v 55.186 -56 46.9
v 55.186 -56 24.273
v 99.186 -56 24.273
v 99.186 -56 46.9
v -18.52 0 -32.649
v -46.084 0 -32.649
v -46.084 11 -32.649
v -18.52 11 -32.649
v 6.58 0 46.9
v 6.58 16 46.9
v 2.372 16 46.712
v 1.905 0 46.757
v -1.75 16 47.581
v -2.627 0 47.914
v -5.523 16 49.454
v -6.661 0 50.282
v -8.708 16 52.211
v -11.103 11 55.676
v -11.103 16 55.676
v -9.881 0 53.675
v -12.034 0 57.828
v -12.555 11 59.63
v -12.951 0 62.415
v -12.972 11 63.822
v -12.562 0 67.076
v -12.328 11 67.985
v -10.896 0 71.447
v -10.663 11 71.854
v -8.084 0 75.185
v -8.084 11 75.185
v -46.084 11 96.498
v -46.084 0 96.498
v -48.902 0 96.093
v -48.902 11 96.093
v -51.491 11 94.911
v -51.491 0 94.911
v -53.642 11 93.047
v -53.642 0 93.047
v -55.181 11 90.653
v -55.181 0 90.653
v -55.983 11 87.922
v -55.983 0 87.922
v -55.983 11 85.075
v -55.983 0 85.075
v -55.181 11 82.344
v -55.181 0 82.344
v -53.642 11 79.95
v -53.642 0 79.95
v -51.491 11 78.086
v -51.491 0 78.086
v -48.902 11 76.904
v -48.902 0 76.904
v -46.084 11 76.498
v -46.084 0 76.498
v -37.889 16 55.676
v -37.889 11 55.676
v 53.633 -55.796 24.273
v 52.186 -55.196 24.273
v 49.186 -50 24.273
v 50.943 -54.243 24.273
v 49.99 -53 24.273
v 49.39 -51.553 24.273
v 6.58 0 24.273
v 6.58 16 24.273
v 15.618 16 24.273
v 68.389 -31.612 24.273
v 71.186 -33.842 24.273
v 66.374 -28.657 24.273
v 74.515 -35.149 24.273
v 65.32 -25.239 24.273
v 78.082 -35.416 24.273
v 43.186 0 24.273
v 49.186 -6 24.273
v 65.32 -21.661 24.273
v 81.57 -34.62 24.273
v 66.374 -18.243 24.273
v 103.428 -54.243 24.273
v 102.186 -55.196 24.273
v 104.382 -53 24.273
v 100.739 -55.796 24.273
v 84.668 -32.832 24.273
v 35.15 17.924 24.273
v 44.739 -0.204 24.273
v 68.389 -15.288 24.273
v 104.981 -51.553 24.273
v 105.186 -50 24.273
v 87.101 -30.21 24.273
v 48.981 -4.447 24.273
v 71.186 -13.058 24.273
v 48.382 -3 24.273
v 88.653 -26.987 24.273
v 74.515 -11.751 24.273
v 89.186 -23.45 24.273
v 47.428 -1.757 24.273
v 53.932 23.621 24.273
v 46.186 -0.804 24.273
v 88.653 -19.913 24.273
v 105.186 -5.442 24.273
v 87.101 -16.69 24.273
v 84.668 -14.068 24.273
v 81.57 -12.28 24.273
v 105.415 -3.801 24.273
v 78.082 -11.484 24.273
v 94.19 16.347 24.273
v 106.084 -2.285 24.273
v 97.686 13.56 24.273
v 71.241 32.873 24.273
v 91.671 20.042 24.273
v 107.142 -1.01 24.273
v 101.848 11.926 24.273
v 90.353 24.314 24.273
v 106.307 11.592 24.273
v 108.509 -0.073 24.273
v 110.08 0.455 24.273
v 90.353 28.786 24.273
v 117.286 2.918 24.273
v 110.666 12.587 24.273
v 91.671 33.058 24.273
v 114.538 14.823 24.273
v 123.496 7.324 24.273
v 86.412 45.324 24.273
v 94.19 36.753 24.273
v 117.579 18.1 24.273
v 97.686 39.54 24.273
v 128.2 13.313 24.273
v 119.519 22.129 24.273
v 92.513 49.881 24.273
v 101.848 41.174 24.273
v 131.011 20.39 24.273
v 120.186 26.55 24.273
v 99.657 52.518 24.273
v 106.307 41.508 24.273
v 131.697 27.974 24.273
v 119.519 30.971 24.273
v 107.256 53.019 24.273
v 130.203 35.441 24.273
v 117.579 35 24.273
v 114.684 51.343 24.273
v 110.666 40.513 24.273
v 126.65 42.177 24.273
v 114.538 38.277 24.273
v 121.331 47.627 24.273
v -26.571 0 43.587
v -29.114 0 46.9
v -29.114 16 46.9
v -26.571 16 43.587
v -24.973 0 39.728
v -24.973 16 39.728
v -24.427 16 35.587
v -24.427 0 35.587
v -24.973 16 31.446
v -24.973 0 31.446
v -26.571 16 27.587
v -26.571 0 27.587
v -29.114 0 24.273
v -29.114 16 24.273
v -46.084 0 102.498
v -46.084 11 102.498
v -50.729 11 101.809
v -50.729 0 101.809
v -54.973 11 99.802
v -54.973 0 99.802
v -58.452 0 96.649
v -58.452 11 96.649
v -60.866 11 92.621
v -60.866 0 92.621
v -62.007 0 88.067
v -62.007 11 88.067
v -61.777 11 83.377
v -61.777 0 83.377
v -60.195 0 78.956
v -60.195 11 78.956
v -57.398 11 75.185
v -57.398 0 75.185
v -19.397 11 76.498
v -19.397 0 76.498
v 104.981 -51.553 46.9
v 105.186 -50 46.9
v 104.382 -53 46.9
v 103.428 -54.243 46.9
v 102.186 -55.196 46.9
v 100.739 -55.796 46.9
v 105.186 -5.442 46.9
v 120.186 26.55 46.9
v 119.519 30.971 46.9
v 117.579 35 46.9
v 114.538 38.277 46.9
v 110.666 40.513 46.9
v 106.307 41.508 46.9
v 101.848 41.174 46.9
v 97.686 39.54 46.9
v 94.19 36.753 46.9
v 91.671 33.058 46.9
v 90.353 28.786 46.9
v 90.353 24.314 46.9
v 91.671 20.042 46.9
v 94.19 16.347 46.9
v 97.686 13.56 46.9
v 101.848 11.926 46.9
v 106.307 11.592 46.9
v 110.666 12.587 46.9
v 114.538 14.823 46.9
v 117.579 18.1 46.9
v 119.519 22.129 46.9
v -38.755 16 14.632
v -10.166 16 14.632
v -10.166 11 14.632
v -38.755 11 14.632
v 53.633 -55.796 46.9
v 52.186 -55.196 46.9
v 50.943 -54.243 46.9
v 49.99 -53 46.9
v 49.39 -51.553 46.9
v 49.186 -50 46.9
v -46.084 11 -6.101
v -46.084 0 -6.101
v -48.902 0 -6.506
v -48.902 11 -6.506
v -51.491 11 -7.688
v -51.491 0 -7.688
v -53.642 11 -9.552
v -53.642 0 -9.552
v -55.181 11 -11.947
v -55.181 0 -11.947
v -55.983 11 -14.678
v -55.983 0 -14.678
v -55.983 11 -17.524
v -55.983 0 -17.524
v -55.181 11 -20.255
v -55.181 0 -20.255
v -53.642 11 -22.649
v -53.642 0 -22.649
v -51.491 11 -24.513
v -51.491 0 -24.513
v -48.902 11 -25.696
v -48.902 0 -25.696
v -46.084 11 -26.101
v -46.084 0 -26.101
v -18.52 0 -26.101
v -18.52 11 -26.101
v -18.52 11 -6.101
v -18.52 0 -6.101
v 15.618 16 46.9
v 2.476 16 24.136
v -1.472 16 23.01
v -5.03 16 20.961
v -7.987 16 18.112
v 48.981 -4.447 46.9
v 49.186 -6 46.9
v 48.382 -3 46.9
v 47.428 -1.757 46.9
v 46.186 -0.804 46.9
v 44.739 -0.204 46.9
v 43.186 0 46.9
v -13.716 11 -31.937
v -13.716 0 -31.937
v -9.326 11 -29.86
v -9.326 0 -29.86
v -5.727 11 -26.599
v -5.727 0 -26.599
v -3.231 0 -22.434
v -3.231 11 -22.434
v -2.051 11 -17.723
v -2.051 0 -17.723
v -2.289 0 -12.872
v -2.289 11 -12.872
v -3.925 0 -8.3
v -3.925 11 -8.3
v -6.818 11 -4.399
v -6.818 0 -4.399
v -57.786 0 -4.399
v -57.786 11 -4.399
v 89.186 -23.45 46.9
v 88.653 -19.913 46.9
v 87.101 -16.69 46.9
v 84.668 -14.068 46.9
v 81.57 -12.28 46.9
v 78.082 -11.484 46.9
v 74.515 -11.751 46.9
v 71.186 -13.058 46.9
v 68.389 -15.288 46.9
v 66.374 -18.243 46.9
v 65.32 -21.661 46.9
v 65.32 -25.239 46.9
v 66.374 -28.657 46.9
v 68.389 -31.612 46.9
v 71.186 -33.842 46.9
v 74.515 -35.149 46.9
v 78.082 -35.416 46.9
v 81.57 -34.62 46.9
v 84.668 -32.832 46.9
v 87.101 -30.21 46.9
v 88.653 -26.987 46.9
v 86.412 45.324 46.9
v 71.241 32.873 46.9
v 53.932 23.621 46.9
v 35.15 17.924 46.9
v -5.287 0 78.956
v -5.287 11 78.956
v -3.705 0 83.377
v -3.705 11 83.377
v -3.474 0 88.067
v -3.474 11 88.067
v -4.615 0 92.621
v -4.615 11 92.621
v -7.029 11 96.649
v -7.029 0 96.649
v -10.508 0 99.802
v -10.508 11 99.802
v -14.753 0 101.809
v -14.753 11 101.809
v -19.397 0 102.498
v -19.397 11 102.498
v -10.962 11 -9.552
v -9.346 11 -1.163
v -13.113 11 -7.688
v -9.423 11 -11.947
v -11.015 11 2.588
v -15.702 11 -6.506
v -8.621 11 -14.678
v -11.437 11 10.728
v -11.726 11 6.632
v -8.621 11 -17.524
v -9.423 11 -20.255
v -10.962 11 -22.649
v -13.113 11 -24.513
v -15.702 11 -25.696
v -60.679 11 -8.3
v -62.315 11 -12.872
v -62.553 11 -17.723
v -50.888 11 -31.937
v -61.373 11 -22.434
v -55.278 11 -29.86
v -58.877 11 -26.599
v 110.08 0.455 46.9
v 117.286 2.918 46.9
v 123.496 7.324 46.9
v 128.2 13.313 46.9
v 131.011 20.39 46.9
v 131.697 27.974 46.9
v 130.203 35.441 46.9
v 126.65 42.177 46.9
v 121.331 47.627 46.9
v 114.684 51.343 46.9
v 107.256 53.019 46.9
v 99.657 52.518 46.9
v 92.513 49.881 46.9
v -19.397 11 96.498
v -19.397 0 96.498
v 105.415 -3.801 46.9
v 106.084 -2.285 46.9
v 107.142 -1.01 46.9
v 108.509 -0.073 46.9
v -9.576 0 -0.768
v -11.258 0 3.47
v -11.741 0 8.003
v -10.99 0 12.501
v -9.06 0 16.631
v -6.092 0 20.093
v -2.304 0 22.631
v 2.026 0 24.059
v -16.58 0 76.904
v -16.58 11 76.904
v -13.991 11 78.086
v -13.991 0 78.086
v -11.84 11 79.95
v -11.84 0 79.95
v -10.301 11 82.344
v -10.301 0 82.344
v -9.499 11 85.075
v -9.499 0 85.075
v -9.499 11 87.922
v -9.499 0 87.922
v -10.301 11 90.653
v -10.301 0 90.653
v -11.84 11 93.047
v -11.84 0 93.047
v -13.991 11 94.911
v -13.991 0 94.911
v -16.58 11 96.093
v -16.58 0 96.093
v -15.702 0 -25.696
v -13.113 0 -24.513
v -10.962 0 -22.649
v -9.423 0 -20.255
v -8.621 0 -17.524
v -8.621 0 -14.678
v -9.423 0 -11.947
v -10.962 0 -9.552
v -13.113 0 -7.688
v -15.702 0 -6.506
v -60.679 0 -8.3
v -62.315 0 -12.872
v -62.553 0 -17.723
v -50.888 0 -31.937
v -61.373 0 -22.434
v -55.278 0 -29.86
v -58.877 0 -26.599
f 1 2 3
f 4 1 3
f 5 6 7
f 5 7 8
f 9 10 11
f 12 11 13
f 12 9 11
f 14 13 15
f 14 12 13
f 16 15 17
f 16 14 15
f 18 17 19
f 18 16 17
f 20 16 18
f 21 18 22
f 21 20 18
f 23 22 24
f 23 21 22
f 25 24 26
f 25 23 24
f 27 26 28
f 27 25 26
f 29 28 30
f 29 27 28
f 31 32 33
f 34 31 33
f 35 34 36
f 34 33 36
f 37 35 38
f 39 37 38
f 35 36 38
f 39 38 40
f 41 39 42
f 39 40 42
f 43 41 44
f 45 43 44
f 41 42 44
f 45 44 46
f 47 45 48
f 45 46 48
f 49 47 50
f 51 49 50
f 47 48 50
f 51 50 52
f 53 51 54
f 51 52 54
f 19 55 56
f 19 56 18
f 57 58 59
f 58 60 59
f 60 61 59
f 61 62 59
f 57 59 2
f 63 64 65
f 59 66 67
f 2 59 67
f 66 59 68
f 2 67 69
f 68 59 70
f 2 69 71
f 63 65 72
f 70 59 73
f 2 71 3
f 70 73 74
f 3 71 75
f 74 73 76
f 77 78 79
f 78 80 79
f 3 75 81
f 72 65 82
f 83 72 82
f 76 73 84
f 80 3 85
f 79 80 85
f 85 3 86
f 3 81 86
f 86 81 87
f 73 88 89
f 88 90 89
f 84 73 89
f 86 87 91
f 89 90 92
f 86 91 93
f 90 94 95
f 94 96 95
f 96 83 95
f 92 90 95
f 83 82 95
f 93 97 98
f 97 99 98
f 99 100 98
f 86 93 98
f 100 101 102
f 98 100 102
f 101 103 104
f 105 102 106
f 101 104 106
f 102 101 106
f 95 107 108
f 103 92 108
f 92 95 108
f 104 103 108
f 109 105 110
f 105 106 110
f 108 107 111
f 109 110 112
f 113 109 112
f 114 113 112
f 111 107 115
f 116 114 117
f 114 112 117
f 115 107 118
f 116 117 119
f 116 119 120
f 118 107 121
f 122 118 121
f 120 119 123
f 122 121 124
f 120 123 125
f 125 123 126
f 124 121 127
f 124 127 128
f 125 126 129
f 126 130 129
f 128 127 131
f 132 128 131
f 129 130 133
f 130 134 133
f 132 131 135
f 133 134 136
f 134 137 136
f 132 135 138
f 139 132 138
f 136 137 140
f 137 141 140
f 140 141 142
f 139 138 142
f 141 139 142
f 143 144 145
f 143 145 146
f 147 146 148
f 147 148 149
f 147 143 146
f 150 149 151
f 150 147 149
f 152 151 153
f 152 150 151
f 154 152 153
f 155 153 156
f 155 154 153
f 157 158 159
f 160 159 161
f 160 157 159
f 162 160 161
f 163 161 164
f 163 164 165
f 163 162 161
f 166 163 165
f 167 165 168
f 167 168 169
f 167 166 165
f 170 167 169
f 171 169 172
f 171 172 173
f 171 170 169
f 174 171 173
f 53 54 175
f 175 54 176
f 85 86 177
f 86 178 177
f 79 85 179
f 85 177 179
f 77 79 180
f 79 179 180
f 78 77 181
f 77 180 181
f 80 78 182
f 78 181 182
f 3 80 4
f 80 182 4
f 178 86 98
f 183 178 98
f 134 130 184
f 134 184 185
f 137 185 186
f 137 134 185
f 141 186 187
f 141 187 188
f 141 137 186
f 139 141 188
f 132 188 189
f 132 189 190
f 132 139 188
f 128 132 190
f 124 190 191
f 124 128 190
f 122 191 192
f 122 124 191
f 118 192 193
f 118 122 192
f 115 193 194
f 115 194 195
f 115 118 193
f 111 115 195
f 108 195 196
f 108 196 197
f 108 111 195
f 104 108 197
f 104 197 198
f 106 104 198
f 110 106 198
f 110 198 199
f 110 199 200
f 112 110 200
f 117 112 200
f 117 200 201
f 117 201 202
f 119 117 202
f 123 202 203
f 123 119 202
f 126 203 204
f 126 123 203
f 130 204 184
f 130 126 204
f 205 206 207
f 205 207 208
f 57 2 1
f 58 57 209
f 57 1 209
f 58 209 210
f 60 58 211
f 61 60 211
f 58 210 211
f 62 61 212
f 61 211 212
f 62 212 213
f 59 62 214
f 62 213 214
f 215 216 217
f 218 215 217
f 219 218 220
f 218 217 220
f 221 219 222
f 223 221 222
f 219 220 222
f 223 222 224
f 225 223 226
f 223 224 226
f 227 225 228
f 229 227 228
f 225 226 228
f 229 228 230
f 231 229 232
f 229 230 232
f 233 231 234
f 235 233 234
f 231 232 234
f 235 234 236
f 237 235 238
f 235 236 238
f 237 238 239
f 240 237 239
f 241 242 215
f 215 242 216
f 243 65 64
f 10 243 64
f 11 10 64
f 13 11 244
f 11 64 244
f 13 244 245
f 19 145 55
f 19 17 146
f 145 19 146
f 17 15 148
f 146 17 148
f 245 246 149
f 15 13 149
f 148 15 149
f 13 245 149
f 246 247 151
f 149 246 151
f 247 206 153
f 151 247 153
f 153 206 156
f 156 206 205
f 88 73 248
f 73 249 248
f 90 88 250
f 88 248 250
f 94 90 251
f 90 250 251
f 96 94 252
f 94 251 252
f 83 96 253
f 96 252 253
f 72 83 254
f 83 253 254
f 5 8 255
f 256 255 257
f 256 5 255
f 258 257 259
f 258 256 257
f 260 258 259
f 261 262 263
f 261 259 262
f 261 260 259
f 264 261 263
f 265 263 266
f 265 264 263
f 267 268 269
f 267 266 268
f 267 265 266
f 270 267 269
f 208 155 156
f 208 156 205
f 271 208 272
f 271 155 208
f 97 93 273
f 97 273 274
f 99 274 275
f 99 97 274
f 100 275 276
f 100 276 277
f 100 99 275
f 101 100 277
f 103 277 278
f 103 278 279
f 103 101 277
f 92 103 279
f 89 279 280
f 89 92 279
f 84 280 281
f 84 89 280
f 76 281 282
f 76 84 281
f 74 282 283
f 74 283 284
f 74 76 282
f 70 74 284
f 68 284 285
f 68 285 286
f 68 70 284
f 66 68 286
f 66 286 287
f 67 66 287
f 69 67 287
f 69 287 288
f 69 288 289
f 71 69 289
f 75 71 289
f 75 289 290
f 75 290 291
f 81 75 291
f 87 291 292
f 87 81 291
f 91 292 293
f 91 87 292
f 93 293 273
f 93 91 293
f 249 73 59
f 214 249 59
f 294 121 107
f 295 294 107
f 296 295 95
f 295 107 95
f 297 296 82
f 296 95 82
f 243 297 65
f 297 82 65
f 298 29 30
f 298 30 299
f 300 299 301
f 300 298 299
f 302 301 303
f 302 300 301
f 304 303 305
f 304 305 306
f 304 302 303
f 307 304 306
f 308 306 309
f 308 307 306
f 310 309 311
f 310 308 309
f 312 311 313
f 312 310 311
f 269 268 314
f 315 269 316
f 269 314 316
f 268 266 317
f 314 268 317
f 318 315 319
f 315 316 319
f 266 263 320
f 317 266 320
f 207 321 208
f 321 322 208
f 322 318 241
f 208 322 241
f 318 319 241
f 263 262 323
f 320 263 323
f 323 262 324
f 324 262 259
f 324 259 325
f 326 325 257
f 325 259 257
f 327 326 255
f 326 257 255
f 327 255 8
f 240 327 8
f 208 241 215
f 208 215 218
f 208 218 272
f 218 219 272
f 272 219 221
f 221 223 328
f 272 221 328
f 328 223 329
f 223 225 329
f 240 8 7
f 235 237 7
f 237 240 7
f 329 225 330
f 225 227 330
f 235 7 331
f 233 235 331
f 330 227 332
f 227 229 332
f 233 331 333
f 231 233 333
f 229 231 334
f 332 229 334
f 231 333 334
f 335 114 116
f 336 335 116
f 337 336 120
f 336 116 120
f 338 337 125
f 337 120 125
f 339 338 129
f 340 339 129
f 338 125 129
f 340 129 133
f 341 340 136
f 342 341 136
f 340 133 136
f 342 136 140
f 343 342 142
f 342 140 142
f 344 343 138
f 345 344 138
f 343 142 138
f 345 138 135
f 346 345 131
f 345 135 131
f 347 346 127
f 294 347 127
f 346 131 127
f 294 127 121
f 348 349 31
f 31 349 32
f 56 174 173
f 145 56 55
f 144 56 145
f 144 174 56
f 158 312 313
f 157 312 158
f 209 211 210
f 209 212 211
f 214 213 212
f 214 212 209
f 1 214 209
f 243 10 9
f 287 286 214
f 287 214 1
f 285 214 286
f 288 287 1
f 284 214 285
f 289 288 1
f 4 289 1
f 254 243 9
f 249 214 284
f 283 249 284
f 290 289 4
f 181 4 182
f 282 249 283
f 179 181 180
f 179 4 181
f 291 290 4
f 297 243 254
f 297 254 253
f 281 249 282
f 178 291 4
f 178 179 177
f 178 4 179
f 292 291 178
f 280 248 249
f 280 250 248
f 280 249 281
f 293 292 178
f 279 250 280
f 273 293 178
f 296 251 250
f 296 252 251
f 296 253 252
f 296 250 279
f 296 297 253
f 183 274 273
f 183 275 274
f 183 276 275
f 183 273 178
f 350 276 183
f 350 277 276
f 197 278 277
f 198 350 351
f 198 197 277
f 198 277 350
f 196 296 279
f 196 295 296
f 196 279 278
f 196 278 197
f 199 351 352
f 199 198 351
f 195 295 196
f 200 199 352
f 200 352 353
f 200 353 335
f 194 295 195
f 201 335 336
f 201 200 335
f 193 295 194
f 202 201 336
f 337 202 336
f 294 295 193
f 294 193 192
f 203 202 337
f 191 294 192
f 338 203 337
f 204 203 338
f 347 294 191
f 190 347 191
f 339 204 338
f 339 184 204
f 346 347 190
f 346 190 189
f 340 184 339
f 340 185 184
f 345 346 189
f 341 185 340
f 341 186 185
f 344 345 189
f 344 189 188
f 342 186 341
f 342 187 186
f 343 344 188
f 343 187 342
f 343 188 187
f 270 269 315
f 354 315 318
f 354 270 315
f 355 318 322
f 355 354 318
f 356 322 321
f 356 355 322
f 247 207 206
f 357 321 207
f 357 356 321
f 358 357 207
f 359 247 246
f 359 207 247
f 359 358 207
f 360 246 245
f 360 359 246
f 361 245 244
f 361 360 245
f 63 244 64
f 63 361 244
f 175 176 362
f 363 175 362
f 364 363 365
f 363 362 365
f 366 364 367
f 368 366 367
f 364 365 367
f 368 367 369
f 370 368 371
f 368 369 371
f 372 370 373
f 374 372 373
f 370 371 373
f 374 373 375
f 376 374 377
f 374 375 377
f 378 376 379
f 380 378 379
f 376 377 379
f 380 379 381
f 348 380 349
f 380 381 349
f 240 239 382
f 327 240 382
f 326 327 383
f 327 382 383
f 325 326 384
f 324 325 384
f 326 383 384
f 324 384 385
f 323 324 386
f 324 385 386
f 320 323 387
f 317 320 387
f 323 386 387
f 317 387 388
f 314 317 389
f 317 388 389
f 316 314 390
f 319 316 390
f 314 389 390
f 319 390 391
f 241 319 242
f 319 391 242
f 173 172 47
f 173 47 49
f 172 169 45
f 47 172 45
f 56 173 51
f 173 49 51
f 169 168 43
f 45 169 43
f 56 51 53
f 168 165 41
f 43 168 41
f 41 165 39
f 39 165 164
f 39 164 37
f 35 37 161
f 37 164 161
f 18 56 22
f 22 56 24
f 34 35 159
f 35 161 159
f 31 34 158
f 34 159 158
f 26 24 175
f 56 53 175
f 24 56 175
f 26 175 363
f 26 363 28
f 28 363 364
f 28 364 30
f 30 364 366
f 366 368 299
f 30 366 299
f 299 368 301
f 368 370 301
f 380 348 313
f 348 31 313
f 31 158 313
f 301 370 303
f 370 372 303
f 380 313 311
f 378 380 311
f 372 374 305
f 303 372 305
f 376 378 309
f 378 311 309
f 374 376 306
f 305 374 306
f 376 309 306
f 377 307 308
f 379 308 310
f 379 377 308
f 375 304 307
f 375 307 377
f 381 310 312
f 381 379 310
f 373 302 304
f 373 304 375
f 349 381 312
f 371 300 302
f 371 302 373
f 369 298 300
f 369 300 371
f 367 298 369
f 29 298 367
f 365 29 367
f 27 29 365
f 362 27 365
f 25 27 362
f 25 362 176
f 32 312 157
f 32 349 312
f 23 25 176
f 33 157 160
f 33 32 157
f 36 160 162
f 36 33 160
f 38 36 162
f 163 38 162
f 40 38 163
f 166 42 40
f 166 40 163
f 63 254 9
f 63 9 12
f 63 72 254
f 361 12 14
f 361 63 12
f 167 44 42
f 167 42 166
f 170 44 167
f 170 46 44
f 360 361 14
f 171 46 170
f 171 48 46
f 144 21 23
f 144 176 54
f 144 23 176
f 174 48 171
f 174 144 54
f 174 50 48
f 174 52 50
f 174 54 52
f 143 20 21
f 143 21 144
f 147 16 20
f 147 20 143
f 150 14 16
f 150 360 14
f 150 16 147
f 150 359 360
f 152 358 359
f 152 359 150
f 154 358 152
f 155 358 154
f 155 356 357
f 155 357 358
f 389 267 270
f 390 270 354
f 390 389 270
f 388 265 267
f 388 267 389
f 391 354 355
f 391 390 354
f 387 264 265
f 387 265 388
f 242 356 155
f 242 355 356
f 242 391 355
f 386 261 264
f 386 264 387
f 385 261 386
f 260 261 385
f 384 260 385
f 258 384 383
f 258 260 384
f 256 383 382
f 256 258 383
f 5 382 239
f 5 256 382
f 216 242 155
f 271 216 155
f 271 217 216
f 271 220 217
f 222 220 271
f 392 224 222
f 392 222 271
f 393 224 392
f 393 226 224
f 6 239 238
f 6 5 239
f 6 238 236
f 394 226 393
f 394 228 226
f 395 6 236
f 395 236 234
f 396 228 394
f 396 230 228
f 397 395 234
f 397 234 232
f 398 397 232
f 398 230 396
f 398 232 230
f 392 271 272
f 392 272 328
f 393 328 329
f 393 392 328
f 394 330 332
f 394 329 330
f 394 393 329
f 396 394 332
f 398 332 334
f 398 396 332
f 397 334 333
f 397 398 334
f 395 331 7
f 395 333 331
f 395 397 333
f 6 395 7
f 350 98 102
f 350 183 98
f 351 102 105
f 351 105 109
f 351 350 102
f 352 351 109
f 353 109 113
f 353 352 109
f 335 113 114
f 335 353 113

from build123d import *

# Parameters (mm, degrees)
BOSS_EXTRUDE1_DEPTH = 16
BOSS_EXTRUDE2_START = -22.627417
SKETCH2_R           = 12
SKETCH2_R_2         = 15
BOSS_EXTRUDE2_DEPTH = 22.627417
FILLET1_R           = 6
SKETCH6_W           = 59.235505044
SKETCH6_H           = 5
CUT_EXTRUDE3_DEPTH  = 46.82239
SKETCH9_W           = 60.661911653
SKETCH9_H           = 5
CUT_EXTRUDE4_DEPTH  = 47.281077


with BuildPart() as part:
    # Sketch1 → Boss-Extrude1 (new body)
    with BuildSketch(Plane(origin=(0, 0, 0), x_dir=(1, 0, 0), z_dir=(0, 1, 0))):
        with BuildLine():
            Line((-46.084327379, 32.649418524), (-18.51965158, 32.649418524))
            ThreePointArc((-18.51965158, 32.649418524), (-3.230722186, 22.433682506), (-6.818011624, 4.399160642))
            ThreePointArc((-6.818011624, 4.399160642), (-10.165791884, -14.631658747), (6.580056768, -24.273042062))
            Line((6.580056768, -24.273042062), (89.580056768, -24.273042062))
            Line((89.580056768, -24.273042062), (89.580056768, -46.90045906))
            Line((89.580056768, -46.90045906), (6.580056768, -46.90045906))
            ThreePointArc((6.580056768, -46.90045906), (-11.103107382, -55.676049041), (-8.083731763, -75.184730307))
            ThreePointArc((-8.083731763, -75.184730307), (-4.615367742, -92.621373724), (-19.397440262, -102.498438806))
            Line((-19.397440262, -102.498438806), (-46.084327379, -102.498438806))
            ThreePointArc((-46.084327379, -102.498438806), (-60.866399899, -92.621373724), (-57.398035878, -75.184730307))
            Line((-57.398035878, -75.184730307), (-29.113764631, -46.90045906))
            ThreePointArc((-29.113764631, -46.90045906), (-24.42747313, -35.586750561), (-29.113764631, -24.273042062))
            Line((-29.113764631, -24.273042062), (-57.785967334, 4.399160642))
            ThreePointArc((-57.785967334, 4.399160642), (-61.373256773, 22.433682506), (-46.084327379, 32.649418524))
        make_face()
        with BuildLine():
            Line((-46.084327379, 26.100800597), (-18.51965158, 26.100800597))
            ThreePointArc((-18.51965158, 26.100800597), (-8.51965158, 16.100800597), (-18.51965158, 6.100800597))
            Line((-18.51965158, 6.100800597), (-46.084327379, 6.100800597))
            ThreePointArc((-46.084327379, 6.100800597), (-56.084327379, 16.100800597), (-46.084327379, 26.100800597))
        make_face(mode=Mode.SUBTRACT)
        with BuildLine():
            Line((-46.084327379, -76.498438806), (-19.397440262, -76.498438806))
            ThreePointArc((-19.397440262, -76.498438806), (-9.397440262, -86.498438806), (-19.397440262, -96.498438806))
            Line((-19.397440262, -96.498438806), (-46.084327379, -96.498438806))
            ThreePointArc((-46.084327379, -96.498438806), (-56.084327379, -86.498438806), (-46.084327379, -76.498438806))
        make_face(mode=Mode.SUBTRACT)
    extrude(amount=BOSS_EXTRUDE1_DEPTH)

    # Sketch2 → Boss-Extrude2 (add)
    with BuildSketch(Plane.XY.offset(46.90045906).offset(BOSS_EXTRUDE2_START)):
        with BuildLine():
            Line((105.185672621, -56), (105.185672621, 0))
            ThreePointArc((105.185672621, 0), (129.714674209, 36.710245129), (86.41198758, 45.323685041))
            ThreePointArc((86.41198758, 45.323685041), (53.931590324, 23.620977443), (15.618349457, 16))
            Line((15.618349457, 16), (89.580056768, 16))
            Line((89.580056768, 16), (89.580056768, 0))
            Line((89.580056768, 0), (49.185672621, 0))
            Line((49.185672621, 0), (49.185672621, -56))
            Line((49.185672621, -56), (105.185672621, -56))
        make_face()
        with Locations((77.185672621, -23.45)):
            Circle(SKETCH2_R, mode=Mode.SUBTRACT)
        with Locations((105.185672621, 26.55)):
            Circle(SKETCH2_R_2, mode=Mode.SUBTRACT)
    extrude(amount=BOSS_EXTRUDE2_DEPTH)

    # Fillet1
    fillet1_edges = [part.edges().sort_by_distance(p)[0] for p in [
        (105.185672621, 0, 35.58675056),
        (105.185672621, -56, 35.58675056),
        (49.185672621, -56, 35.58675056),
        (49.185672621, 0, 35.58675056),
    ]]
    fillet(fillet1_edges, radius=FILLET1_R)

    # Sketch6 → Cut-Extrude3 (cut)
    with BuildSketch(Plane.XY.offset(102.498438806)):
        with Locations((-33.015192784, 13.5)):
            Rectangle(SKETCH6_W, SKETCH6_H)
    extrude(amount=-CUT_EXTRUDE3_DEPTH, mode=Mode.SUBTRACT)

    # Sketch9 → Cut-Extrude4 (cut)
    with BuildSketch(Plane(origin=(0, 0, -32.649418524), x_dir=(-1, 0, 0), z_dir=(0, 0, -1))):
        with Locations((32.30198948, 13.5)):
            Rectangle(SKETCH9_W, SKETCH9_H)
    extrude(amount=-CUT_EXTRUDE4_DEPTH, mode=Mode.SUBTRACT)


solid = part.part
